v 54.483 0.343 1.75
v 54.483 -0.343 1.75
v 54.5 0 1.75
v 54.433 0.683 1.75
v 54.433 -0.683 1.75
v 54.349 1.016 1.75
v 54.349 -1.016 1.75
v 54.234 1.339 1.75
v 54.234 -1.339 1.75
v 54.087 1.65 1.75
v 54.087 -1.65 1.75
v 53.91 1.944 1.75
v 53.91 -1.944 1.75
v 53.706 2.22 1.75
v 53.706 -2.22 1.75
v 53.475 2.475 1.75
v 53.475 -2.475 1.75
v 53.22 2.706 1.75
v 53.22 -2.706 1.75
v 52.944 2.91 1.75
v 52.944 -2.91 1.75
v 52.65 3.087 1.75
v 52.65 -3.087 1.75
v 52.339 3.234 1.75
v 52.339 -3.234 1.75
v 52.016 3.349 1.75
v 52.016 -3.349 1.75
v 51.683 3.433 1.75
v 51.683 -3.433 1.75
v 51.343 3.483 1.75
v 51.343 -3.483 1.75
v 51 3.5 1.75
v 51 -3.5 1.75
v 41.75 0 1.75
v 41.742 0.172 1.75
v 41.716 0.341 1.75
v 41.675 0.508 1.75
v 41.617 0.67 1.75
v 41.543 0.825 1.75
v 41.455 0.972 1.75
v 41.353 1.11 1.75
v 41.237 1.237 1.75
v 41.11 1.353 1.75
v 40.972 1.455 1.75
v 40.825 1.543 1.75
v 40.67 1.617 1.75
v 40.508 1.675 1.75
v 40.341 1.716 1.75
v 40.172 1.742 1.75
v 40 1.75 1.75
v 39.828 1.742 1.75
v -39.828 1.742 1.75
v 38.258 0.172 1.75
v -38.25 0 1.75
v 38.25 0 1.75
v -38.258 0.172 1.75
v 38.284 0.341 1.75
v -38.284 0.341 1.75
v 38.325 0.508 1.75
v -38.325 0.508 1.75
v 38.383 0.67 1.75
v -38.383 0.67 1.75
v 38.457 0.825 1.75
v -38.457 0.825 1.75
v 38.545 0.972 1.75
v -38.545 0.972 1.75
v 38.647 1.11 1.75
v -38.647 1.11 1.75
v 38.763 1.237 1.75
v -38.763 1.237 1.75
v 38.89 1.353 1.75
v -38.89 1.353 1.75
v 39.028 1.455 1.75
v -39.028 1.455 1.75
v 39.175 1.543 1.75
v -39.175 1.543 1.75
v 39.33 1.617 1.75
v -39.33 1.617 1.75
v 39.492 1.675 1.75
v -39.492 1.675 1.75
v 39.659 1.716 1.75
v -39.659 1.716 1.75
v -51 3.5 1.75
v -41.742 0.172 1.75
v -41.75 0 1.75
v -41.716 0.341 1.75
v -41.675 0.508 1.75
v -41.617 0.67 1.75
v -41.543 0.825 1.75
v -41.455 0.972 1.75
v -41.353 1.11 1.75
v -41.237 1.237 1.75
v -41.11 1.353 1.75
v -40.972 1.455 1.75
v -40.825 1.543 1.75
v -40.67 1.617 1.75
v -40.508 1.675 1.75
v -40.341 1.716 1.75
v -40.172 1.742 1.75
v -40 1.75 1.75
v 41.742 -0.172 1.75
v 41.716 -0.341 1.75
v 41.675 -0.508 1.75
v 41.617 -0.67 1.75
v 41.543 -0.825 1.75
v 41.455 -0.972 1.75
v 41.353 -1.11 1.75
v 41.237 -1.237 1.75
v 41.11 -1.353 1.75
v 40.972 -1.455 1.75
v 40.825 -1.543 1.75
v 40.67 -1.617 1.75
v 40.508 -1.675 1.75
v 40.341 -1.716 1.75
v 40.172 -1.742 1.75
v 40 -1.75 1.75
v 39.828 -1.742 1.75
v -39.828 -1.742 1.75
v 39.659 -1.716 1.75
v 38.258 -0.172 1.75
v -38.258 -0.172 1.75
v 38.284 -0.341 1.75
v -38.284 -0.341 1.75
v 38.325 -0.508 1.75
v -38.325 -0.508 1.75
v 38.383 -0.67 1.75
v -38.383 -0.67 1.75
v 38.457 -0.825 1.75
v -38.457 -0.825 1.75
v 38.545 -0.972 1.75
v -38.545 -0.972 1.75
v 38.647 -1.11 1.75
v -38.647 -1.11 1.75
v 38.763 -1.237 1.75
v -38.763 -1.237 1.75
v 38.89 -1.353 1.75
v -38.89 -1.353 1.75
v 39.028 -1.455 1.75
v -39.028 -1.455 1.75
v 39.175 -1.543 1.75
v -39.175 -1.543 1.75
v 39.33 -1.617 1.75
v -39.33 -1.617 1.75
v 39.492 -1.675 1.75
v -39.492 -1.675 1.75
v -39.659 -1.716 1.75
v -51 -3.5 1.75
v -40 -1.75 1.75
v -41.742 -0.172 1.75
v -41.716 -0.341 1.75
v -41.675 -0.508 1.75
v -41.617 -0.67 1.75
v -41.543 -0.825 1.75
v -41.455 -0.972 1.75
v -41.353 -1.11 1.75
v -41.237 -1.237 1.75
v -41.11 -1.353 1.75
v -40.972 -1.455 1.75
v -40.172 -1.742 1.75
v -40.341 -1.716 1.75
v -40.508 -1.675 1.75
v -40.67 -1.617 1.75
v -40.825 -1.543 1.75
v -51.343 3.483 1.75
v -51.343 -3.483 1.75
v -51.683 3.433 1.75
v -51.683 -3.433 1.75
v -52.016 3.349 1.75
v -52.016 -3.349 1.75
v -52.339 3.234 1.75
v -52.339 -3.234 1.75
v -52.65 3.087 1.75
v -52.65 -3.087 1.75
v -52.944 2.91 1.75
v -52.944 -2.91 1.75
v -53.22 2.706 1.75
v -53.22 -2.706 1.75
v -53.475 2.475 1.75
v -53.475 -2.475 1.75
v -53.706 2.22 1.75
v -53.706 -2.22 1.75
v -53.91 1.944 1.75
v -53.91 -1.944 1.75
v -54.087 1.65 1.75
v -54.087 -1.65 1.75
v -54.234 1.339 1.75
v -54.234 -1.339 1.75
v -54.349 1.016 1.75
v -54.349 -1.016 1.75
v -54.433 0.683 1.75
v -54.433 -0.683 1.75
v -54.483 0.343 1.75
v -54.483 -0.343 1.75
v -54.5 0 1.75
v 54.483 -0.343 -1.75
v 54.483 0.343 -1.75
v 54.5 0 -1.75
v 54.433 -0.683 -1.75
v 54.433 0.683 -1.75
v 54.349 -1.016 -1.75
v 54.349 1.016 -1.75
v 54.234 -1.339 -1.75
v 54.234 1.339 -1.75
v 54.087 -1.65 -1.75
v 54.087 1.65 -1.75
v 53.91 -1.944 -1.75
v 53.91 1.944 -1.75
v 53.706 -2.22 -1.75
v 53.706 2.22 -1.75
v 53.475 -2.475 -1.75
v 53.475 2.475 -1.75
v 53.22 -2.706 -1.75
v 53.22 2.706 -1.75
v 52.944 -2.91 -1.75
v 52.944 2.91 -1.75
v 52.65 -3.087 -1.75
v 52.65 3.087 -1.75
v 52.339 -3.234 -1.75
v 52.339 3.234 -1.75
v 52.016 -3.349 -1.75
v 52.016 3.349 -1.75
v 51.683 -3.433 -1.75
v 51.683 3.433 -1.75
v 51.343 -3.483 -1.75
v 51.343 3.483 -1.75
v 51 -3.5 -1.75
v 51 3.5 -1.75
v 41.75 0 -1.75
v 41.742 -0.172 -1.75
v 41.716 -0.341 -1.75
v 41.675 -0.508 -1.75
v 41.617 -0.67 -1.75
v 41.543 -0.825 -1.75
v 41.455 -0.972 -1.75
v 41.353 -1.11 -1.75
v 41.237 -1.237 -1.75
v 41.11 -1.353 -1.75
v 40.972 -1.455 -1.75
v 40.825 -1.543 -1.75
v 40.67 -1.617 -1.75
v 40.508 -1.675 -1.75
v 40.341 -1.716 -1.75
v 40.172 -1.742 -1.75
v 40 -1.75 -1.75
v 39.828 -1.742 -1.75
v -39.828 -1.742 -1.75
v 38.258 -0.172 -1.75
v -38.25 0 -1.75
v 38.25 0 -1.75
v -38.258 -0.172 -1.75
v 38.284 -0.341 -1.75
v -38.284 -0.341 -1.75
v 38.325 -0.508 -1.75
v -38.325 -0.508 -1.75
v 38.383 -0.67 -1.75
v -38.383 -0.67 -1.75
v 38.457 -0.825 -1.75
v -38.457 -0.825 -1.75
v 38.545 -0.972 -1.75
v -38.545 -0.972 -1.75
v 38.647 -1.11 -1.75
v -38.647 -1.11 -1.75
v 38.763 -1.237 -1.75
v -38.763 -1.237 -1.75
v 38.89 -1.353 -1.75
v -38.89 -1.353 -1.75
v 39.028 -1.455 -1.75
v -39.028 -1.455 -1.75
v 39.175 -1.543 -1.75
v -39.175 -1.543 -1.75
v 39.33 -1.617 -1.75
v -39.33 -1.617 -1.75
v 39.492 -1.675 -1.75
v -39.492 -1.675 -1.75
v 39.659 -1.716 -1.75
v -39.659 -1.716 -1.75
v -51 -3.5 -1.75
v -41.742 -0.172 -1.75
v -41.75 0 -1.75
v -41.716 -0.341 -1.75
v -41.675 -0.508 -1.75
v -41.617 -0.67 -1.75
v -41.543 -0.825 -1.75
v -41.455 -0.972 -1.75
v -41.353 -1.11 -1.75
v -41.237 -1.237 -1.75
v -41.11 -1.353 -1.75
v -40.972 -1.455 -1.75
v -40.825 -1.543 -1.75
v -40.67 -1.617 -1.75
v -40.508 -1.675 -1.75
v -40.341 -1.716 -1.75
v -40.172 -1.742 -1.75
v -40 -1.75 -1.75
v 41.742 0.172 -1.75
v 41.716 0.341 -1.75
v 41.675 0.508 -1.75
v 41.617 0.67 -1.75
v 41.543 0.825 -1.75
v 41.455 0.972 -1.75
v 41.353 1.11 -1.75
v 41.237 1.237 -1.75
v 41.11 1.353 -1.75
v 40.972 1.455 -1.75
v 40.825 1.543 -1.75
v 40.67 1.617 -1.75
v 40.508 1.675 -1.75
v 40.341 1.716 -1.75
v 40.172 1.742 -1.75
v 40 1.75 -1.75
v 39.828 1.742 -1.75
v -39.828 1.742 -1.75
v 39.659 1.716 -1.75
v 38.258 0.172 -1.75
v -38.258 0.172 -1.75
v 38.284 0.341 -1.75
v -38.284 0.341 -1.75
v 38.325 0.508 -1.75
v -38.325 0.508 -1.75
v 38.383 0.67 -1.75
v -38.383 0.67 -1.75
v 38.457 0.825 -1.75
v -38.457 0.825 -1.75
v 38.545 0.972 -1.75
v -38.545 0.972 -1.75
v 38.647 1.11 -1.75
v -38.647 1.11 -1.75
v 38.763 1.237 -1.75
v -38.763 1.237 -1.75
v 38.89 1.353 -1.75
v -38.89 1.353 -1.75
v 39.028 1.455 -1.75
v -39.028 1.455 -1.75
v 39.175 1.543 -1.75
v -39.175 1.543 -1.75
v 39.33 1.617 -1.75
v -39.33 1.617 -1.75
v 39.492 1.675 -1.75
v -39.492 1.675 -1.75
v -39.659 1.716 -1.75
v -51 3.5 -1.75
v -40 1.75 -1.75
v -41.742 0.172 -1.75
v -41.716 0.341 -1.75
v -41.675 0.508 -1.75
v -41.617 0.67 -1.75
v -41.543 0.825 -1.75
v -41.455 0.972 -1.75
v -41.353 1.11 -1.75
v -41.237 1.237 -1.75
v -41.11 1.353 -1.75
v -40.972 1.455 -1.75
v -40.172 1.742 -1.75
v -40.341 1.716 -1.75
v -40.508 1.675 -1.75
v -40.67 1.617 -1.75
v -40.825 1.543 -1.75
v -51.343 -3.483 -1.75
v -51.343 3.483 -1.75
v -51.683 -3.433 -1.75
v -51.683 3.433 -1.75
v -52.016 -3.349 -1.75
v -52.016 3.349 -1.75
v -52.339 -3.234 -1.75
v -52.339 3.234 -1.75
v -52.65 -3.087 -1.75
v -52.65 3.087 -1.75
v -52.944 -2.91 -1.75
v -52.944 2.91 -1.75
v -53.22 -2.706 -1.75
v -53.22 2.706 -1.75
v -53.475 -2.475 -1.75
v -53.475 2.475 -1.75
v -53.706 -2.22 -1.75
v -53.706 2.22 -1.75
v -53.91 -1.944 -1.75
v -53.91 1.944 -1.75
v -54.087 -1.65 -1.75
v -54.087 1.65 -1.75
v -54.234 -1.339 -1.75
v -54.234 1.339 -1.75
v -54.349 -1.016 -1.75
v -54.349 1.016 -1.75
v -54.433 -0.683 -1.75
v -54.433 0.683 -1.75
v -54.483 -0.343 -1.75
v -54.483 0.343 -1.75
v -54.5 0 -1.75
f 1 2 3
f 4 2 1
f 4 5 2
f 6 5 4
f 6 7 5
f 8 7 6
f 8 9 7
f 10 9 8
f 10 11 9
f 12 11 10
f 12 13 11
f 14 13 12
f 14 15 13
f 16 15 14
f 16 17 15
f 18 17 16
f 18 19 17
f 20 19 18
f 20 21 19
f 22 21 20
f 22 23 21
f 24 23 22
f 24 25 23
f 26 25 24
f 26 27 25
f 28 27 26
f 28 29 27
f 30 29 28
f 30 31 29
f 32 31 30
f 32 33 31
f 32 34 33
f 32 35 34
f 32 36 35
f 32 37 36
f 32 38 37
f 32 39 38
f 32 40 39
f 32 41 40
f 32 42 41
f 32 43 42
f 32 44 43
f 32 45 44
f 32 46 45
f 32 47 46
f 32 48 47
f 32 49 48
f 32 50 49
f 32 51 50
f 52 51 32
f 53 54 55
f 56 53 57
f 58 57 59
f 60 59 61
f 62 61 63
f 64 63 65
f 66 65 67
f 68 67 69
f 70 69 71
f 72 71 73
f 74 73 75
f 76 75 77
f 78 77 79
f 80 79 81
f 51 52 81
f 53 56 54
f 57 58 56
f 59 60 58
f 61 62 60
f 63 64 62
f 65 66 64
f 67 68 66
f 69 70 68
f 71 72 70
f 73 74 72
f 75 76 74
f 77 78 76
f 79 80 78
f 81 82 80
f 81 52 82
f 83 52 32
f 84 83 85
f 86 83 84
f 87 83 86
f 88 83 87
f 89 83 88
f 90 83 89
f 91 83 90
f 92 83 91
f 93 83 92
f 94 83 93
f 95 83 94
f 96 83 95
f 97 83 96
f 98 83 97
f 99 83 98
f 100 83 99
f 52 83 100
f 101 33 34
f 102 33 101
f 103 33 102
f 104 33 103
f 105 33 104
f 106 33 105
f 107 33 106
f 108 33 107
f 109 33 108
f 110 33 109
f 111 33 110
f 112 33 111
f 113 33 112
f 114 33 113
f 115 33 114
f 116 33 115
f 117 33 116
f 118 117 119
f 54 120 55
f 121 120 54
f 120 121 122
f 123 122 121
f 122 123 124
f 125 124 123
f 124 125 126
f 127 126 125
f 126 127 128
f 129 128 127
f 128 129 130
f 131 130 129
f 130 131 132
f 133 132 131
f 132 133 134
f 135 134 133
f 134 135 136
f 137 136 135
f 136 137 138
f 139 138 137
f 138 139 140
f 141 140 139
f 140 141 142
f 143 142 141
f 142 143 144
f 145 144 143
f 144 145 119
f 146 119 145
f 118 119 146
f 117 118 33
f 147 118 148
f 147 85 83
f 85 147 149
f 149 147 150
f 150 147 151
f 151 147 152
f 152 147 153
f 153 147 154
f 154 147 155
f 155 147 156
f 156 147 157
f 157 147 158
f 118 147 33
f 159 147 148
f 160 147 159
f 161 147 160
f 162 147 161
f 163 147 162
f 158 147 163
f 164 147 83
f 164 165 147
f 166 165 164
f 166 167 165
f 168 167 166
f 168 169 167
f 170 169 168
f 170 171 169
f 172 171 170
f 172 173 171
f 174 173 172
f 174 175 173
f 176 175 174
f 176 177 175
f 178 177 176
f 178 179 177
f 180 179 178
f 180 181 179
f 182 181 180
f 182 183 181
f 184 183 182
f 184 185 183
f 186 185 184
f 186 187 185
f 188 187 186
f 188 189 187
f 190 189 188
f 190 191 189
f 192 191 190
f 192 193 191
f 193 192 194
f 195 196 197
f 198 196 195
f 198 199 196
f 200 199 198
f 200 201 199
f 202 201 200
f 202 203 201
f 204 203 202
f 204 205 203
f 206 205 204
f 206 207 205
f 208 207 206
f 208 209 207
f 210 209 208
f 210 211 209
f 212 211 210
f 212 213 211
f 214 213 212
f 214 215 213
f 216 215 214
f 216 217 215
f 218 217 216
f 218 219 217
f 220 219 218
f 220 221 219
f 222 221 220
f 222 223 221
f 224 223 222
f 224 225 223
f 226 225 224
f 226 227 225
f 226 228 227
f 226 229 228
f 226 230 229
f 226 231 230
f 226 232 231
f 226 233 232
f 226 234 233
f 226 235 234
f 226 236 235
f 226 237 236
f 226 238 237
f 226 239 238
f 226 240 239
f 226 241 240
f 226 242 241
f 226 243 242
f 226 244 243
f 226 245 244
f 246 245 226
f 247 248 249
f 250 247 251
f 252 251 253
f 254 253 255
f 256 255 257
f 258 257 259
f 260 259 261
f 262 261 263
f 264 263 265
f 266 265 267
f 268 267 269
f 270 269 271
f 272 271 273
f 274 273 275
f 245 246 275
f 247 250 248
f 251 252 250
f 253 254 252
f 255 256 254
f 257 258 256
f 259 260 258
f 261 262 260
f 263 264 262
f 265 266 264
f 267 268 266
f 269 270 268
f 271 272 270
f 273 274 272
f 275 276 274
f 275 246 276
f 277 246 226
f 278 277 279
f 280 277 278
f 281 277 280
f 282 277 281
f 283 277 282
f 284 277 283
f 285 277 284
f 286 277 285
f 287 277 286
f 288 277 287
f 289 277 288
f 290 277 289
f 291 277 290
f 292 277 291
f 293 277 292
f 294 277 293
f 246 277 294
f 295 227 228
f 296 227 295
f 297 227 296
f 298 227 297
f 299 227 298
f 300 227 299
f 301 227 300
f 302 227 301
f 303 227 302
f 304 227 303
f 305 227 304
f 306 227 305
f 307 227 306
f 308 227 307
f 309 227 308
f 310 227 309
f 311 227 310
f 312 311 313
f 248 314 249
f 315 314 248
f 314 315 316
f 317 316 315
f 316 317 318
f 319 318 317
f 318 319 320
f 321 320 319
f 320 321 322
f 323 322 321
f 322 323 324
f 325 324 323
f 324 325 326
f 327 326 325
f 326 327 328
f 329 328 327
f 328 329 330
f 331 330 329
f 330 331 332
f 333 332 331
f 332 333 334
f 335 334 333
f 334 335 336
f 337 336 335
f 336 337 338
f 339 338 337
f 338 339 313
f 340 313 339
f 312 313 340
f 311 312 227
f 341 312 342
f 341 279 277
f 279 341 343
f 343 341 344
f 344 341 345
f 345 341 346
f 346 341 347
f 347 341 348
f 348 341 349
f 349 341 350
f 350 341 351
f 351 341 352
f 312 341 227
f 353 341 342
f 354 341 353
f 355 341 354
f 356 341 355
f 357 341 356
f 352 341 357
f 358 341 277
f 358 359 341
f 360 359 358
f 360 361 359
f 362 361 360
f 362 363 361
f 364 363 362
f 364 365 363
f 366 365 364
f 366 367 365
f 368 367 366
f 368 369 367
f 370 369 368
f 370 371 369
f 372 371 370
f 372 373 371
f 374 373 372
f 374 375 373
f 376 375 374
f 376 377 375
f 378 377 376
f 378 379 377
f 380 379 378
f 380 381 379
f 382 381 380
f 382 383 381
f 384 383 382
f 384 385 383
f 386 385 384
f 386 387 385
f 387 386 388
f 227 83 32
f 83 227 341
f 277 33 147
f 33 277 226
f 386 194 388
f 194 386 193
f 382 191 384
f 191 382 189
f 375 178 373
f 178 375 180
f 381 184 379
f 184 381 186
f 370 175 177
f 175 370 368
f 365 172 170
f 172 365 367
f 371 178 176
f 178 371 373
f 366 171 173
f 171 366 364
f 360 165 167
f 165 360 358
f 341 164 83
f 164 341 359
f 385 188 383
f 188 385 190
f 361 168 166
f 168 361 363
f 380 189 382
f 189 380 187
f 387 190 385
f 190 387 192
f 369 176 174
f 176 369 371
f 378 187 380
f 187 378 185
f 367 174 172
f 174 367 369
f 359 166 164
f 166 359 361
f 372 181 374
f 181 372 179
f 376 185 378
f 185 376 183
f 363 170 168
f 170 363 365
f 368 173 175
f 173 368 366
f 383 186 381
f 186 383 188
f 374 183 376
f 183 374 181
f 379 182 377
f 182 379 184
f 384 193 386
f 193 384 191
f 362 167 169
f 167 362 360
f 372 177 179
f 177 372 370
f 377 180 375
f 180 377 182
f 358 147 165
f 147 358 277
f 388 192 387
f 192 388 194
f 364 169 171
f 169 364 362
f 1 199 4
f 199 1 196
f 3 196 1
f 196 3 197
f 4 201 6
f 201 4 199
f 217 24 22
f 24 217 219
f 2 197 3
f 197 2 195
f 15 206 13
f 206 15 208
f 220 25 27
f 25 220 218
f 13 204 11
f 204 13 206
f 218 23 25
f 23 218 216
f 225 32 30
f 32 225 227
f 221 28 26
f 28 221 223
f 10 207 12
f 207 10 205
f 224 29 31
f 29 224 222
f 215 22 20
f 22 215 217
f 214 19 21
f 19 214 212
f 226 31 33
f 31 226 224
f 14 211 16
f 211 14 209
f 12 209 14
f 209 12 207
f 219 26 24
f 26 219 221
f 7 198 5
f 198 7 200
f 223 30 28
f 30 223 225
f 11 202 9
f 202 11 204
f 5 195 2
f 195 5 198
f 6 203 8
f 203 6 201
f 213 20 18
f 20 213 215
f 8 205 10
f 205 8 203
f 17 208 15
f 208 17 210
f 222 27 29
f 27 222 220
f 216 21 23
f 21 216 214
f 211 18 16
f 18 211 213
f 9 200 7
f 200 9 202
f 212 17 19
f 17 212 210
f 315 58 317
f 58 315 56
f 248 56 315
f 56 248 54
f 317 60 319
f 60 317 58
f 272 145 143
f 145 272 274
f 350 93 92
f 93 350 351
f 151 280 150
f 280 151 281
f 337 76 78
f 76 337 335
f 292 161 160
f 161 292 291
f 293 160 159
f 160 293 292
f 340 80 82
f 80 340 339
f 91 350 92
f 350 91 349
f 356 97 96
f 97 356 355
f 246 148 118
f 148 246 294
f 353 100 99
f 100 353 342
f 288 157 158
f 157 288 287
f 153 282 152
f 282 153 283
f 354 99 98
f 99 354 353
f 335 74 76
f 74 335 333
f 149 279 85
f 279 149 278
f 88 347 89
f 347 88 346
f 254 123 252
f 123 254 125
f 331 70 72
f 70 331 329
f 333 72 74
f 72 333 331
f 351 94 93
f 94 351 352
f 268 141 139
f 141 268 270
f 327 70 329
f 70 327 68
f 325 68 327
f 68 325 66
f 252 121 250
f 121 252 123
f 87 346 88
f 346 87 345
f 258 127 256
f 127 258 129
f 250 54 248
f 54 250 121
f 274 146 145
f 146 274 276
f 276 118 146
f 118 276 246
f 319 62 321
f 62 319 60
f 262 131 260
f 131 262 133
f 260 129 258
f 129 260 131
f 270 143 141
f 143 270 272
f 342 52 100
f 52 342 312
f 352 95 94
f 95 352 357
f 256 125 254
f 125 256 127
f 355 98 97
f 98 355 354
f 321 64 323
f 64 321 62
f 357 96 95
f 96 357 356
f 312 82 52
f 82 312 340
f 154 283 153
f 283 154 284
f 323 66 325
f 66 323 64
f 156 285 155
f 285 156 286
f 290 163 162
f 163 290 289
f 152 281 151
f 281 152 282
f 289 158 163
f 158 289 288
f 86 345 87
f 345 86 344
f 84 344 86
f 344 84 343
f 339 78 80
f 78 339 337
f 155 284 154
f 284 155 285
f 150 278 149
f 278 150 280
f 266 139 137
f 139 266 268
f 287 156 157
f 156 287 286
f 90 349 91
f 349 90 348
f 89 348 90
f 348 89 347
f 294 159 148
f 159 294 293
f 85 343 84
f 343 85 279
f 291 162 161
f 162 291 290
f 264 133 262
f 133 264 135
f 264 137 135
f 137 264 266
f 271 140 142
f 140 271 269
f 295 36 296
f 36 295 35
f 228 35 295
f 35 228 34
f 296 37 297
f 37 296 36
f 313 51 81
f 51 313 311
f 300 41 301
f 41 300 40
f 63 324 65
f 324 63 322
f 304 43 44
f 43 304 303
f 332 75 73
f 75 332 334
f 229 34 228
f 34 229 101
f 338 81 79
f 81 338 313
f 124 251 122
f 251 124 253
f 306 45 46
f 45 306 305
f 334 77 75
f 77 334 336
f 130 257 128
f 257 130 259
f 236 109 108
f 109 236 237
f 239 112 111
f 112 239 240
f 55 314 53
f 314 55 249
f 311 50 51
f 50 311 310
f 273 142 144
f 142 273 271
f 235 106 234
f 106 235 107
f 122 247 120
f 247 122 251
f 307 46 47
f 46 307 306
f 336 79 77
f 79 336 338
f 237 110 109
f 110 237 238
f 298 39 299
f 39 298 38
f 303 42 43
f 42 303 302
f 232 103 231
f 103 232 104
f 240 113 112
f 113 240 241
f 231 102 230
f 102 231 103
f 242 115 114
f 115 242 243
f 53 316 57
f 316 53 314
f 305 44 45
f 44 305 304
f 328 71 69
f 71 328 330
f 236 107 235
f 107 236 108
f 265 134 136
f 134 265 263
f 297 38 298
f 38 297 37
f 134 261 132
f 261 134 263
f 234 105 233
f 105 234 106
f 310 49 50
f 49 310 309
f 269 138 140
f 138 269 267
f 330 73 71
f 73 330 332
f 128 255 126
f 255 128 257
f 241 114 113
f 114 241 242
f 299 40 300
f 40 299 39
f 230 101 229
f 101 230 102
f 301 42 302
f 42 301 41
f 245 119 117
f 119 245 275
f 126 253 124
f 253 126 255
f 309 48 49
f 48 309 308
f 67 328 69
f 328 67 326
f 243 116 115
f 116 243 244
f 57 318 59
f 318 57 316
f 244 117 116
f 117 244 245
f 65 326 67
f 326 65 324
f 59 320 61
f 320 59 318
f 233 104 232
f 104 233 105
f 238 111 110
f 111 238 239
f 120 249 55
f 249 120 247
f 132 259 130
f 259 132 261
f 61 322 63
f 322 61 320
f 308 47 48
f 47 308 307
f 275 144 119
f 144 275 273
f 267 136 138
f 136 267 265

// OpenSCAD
module rounded_link() {
    difference() {
        union() {
            // Main body with rounded ends
            translate([-51, -3.5, -1.75])
                cube([102, 7, 3.5]);
            translate([-51, 0, -1.75])
                cylinder(h=3.5, r=3.5, $fn=64);
            translate([51, 0, -1.75])
                cylinder(h=3.5, r=3.5, $fn=64);
        }
        // Holes near each end
        translate([-40, 0, -5])
            cylinder(h=10, r=1.75, $fn=64);
        translate([40, 0, -5])
            cylinder(h=10, r=1.75, $fn=64);
    }
}

rounded_link();
